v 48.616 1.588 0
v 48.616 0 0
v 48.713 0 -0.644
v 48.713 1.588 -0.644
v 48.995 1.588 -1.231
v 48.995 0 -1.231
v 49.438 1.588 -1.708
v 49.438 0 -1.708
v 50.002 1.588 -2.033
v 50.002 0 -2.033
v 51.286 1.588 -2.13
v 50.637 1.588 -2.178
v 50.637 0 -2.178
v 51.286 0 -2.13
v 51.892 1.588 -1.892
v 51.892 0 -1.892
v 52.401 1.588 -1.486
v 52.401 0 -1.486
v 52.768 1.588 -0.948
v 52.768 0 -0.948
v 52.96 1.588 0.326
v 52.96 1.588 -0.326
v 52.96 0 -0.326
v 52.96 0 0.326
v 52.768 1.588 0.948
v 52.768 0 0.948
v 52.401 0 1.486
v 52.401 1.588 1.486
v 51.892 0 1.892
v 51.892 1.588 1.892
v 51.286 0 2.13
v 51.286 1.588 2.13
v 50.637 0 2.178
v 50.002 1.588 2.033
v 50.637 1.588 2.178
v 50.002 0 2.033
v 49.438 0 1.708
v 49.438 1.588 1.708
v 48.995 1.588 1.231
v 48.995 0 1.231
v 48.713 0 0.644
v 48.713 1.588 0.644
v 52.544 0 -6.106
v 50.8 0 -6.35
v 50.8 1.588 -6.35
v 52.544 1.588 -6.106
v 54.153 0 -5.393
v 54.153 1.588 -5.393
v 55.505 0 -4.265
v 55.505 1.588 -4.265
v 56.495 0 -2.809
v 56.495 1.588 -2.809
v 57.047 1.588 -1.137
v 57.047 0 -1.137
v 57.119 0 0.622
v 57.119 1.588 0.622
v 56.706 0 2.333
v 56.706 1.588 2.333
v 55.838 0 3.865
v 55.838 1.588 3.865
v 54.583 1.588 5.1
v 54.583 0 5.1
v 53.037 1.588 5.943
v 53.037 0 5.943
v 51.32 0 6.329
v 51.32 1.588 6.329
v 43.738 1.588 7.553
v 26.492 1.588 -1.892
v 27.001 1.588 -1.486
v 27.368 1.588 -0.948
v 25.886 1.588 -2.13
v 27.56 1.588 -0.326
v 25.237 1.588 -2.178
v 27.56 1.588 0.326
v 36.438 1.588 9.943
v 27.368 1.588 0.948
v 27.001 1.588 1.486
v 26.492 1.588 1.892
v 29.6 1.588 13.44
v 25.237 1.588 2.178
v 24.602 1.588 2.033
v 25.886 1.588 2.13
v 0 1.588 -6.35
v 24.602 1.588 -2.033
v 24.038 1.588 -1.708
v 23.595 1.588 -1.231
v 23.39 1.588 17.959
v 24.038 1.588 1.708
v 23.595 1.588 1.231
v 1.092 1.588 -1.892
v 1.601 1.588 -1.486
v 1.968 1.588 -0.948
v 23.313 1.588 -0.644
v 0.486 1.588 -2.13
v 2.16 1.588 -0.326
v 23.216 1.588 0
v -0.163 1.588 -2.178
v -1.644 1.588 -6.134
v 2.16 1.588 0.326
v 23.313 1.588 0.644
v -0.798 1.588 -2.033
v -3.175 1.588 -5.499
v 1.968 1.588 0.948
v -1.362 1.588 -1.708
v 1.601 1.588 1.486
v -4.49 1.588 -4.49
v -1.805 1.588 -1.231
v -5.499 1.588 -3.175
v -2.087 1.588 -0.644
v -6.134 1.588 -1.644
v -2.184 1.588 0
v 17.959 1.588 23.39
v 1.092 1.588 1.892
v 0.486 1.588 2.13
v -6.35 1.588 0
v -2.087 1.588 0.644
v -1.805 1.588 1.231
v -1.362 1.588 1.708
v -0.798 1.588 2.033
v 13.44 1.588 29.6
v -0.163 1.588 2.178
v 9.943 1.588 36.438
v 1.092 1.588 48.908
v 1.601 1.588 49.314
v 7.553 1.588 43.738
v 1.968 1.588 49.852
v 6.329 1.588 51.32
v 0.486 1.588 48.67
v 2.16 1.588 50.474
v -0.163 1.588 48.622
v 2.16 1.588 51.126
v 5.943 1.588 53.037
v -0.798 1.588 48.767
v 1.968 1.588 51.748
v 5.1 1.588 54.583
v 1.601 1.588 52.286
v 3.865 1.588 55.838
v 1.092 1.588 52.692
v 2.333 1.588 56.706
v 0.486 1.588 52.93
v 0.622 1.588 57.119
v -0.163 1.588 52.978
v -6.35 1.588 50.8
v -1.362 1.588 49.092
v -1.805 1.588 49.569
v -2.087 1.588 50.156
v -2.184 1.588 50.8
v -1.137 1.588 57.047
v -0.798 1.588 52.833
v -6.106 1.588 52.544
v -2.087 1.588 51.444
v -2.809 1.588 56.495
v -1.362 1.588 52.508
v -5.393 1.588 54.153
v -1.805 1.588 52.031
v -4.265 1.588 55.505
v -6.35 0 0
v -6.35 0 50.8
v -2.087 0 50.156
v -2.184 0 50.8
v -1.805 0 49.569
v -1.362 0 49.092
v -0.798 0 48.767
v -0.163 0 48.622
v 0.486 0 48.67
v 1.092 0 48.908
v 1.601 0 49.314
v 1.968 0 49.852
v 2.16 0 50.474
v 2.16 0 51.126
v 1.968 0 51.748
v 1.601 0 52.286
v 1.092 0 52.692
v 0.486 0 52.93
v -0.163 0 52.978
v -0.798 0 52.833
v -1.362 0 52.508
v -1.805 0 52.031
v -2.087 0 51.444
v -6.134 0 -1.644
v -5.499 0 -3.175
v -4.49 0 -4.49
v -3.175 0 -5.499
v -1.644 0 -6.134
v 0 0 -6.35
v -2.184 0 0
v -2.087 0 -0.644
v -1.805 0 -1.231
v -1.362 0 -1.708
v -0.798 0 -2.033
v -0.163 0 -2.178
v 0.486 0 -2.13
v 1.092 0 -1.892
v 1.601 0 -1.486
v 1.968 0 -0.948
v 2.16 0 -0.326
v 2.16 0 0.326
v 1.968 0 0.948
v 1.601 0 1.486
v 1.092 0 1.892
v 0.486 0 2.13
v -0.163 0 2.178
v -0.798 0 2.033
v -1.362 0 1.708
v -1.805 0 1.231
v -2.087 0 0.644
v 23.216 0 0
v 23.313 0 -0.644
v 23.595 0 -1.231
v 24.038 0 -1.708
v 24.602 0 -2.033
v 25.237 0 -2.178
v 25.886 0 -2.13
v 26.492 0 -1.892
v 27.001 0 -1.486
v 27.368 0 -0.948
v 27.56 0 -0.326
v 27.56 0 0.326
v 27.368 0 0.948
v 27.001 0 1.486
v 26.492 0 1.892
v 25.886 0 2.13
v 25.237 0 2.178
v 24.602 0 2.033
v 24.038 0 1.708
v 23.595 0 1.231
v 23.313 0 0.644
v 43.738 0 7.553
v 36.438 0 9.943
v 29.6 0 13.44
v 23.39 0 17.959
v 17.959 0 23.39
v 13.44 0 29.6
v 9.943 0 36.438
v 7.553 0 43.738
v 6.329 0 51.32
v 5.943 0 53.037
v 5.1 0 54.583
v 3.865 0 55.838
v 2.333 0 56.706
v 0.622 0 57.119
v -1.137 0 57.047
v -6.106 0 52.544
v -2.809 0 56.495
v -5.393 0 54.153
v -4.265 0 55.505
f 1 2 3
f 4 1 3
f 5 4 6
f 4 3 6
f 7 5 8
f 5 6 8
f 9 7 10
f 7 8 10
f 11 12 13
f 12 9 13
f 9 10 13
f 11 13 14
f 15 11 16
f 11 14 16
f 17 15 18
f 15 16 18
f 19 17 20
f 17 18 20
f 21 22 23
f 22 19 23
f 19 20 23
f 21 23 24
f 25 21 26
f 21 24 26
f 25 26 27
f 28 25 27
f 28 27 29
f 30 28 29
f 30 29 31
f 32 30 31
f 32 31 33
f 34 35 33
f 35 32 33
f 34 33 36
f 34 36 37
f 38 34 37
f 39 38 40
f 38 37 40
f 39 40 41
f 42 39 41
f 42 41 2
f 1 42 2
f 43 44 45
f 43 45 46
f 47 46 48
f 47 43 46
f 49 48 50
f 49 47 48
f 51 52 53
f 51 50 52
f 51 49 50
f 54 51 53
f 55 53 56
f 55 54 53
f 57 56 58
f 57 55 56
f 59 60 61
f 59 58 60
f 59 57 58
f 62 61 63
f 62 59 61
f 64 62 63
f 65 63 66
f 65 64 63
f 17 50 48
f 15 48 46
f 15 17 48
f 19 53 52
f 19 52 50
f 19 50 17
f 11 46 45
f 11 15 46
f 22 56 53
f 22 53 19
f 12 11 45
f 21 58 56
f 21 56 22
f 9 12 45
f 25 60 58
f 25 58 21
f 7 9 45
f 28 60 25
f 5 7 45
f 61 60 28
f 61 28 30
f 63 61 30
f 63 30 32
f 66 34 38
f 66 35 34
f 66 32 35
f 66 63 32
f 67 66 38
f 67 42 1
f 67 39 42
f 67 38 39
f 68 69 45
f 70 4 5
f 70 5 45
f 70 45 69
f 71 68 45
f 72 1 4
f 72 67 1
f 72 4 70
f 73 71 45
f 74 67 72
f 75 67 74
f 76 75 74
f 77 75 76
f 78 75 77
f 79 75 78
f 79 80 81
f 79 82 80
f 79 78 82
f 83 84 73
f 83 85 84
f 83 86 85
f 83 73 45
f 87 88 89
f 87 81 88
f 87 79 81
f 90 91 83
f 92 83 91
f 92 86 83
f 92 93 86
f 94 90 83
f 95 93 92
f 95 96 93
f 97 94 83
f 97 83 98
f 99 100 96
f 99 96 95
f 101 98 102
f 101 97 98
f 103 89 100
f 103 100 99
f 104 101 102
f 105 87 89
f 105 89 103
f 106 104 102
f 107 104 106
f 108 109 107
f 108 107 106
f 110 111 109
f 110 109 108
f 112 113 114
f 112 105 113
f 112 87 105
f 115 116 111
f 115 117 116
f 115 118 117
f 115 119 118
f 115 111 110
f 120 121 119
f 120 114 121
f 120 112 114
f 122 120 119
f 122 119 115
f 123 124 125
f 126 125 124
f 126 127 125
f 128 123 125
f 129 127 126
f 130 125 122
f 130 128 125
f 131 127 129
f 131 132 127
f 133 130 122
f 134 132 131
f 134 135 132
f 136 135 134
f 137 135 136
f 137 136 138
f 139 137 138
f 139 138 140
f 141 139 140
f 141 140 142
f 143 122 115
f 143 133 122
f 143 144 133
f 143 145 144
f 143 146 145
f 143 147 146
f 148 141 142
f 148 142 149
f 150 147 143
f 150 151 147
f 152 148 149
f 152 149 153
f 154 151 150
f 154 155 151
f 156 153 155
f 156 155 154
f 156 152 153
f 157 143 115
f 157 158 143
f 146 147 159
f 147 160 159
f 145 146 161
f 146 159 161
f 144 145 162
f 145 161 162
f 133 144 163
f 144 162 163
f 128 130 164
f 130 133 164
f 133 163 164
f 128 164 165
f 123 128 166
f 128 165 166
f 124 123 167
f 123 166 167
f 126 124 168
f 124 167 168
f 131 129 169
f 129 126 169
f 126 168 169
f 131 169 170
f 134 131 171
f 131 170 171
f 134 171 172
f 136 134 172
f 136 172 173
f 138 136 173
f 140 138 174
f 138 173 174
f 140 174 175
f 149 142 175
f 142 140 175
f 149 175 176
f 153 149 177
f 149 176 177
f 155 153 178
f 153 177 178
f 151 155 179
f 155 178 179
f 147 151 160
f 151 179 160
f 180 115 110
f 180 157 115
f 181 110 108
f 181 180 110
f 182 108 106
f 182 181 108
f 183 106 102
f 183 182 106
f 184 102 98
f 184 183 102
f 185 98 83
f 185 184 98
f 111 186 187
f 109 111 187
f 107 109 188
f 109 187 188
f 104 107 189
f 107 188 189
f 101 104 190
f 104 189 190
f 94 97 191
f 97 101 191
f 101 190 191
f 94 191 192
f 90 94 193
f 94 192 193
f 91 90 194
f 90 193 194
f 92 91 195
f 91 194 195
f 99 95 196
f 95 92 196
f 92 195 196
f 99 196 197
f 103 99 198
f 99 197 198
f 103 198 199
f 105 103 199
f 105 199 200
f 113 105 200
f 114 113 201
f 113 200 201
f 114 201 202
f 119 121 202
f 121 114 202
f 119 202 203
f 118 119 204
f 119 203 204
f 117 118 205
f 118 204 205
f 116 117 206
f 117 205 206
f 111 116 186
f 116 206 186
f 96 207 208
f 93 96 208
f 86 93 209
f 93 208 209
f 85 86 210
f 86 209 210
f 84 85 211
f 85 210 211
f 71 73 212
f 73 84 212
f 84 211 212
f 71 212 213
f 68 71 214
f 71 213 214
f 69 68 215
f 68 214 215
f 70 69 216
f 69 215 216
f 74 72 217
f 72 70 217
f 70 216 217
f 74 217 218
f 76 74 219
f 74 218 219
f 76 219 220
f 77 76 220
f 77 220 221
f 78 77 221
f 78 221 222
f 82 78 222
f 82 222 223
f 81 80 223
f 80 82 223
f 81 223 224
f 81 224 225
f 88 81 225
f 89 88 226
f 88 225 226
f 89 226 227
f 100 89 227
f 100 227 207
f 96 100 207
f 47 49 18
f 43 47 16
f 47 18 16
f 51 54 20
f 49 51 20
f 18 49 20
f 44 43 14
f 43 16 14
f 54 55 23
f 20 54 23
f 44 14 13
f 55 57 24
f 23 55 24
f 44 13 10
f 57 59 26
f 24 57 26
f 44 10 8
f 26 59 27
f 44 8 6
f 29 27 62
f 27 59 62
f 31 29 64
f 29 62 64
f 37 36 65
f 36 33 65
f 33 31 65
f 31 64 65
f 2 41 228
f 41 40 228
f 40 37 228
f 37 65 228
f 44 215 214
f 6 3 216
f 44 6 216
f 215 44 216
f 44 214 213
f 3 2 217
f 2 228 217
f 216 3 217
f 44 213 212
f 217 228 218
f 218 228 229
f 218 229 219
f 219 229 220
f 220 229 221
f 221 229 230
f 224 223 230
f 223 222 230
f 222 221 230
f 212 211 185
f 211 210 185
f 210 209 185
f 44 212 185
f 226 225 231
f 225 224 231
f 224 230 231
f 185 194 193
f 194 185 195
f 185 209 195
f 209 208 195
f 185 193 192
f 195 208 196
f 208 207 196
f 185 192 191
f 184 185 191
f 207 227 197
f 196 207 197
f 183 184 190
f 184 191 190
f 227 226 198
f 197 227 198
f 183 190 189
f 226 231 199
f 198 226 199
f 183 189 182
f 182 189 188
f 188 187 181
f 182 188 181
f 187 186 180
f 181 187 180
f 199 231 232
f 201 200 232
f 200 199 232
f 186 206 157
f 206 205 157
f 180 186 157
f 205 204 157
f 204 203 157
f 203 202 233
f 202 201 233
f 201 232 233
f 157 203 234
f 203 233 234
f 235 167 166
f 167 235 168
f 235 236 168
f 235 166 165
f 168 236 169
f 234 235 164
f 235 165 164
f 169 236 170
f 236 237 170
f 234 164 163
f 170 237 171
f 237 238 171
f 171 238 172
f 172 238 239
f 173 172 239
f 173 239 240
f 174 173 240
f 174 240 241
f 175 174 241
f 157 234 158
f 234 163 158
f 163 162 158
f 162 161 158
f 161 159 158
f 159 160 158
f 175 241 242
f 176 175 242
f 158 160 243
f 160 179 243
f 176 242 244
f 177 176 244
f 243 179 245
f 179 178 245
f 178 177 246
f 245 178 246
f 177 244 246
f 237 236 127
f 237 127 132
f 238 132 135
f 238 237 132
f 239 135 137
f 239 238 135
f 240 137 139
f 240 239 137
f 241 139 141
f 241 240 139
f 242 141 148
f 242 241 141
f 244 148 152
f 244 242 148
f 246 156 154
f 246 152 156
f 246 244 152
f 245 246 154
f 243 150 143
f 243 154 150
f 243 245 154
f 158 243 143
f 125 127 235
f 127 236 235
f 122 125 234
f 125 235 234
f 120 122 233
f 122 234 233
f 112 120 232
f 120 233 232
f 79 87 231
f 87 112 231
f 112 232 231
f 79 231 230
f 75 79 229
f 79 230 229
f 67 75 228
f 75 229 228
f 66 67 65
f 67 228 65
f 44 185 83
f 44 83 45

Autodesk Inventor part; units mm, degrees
ref_plane "YZ Plane" through (0, 0, 0) normal (1, 0, 0) x (0, 1, 0)
ref_plane "XZ Plane" through (0, 0, 0) normal (0, 1, 0) x (-1, 0, 0)
ref_plane "XY Plane" through (0, 0, 0) normal (0, 0, 1) x (1, 0, 0)
sketch "main" plane through (0, 0, 0) normal (0, 0, 1) x (1, 0, 0)
  circle A0 centre (27.8145, 23.5161) radius 2.1844
  circle A1 centre (27.8145, -27.2839) radius 2.1844
  circle A2 centre (-22.9855, -27.2839) radius 2.1844
  arc A3 (-23.5053, -20.9552) -> (-22.9855, -33.6339) centre (-22.9855, -27.2839) ccw
  arc A4 (27.8145, -33.6339) -> (34.1645, -27.2839) centre (27.8145, -27.2839) ccw
  arc A5 (34.1645, 23.5161) -> (21.4858, 24.0358) centre (27.8145, 23.5161) ccw
  line L0 (34.1645, 23.5161) -> (34.1645, -27.2839)
  line L1 (27.8145, -33.6339) -> (-22.9855, -33.6339)
  arc A6 (-23.5053, -20.9552) -> (21.4858, 24.0358) centre (-27.5308, 28.0614) ccw
  point P0 (11.2944, -10.7639)
sketch "Sketch1" plane through (0, 0, 0) normal (0, 1, 0) x (-1, 0, 0)
  circle A0 centre (-25.4, 0) radius 2.1844
  circle A1 centre (0, 50.8) radius 2.1844
  circle A2 centre (0, 0) radius 2.1844
  circle A3 centre (-50.8, 0) radius 2.1844
  arc A4 (-51.3197, 6.3287) -> (-50.8, -6.35) centre (-50.8, 0) ccw
  arc A5 (0, -6.35) -> (6.35, 0) centre (0, 0) ccw
  arc A6 (6.35, 50.8) -> (-6.3287, 51.3197) centre (0, 50.8) ccw
  line L0 (6.35, 50.8) -> (6.35, 0)
  line L1 (0, -6.35) -> (-50.8, -6.35)
  arc A7 (-51.3197, 6.3287) -> (-6.3287, 51.3197) centre (-55.3453, 55.3453) ccw
  dimension "d2" = 4.3688
extrude "Extrusion1" add sketch "Sketch1" along normal blind 1.5875
equation "\"BendRadius\" = Thickness"
equation "\"BendReliefWidth\" = Thickness"
equation "\"BendReliefDepth\" = 0.5 * Thickness"
equation "\"CornerReliefSize\" = 4 * Thickness"
equation "\"MinimumRemnant\" = 2 * Thickness"
equation "\"TransitionRadius\" = BendRadius"
equation "\"JacobiRadiusSize\" = BendRadius"
equation "\"GapSize\" = Thickness"
equation "\"Thickness\" = 1.5875"
properties part number "Arm Triangle Gusset" material "Acetal Resin, White"
